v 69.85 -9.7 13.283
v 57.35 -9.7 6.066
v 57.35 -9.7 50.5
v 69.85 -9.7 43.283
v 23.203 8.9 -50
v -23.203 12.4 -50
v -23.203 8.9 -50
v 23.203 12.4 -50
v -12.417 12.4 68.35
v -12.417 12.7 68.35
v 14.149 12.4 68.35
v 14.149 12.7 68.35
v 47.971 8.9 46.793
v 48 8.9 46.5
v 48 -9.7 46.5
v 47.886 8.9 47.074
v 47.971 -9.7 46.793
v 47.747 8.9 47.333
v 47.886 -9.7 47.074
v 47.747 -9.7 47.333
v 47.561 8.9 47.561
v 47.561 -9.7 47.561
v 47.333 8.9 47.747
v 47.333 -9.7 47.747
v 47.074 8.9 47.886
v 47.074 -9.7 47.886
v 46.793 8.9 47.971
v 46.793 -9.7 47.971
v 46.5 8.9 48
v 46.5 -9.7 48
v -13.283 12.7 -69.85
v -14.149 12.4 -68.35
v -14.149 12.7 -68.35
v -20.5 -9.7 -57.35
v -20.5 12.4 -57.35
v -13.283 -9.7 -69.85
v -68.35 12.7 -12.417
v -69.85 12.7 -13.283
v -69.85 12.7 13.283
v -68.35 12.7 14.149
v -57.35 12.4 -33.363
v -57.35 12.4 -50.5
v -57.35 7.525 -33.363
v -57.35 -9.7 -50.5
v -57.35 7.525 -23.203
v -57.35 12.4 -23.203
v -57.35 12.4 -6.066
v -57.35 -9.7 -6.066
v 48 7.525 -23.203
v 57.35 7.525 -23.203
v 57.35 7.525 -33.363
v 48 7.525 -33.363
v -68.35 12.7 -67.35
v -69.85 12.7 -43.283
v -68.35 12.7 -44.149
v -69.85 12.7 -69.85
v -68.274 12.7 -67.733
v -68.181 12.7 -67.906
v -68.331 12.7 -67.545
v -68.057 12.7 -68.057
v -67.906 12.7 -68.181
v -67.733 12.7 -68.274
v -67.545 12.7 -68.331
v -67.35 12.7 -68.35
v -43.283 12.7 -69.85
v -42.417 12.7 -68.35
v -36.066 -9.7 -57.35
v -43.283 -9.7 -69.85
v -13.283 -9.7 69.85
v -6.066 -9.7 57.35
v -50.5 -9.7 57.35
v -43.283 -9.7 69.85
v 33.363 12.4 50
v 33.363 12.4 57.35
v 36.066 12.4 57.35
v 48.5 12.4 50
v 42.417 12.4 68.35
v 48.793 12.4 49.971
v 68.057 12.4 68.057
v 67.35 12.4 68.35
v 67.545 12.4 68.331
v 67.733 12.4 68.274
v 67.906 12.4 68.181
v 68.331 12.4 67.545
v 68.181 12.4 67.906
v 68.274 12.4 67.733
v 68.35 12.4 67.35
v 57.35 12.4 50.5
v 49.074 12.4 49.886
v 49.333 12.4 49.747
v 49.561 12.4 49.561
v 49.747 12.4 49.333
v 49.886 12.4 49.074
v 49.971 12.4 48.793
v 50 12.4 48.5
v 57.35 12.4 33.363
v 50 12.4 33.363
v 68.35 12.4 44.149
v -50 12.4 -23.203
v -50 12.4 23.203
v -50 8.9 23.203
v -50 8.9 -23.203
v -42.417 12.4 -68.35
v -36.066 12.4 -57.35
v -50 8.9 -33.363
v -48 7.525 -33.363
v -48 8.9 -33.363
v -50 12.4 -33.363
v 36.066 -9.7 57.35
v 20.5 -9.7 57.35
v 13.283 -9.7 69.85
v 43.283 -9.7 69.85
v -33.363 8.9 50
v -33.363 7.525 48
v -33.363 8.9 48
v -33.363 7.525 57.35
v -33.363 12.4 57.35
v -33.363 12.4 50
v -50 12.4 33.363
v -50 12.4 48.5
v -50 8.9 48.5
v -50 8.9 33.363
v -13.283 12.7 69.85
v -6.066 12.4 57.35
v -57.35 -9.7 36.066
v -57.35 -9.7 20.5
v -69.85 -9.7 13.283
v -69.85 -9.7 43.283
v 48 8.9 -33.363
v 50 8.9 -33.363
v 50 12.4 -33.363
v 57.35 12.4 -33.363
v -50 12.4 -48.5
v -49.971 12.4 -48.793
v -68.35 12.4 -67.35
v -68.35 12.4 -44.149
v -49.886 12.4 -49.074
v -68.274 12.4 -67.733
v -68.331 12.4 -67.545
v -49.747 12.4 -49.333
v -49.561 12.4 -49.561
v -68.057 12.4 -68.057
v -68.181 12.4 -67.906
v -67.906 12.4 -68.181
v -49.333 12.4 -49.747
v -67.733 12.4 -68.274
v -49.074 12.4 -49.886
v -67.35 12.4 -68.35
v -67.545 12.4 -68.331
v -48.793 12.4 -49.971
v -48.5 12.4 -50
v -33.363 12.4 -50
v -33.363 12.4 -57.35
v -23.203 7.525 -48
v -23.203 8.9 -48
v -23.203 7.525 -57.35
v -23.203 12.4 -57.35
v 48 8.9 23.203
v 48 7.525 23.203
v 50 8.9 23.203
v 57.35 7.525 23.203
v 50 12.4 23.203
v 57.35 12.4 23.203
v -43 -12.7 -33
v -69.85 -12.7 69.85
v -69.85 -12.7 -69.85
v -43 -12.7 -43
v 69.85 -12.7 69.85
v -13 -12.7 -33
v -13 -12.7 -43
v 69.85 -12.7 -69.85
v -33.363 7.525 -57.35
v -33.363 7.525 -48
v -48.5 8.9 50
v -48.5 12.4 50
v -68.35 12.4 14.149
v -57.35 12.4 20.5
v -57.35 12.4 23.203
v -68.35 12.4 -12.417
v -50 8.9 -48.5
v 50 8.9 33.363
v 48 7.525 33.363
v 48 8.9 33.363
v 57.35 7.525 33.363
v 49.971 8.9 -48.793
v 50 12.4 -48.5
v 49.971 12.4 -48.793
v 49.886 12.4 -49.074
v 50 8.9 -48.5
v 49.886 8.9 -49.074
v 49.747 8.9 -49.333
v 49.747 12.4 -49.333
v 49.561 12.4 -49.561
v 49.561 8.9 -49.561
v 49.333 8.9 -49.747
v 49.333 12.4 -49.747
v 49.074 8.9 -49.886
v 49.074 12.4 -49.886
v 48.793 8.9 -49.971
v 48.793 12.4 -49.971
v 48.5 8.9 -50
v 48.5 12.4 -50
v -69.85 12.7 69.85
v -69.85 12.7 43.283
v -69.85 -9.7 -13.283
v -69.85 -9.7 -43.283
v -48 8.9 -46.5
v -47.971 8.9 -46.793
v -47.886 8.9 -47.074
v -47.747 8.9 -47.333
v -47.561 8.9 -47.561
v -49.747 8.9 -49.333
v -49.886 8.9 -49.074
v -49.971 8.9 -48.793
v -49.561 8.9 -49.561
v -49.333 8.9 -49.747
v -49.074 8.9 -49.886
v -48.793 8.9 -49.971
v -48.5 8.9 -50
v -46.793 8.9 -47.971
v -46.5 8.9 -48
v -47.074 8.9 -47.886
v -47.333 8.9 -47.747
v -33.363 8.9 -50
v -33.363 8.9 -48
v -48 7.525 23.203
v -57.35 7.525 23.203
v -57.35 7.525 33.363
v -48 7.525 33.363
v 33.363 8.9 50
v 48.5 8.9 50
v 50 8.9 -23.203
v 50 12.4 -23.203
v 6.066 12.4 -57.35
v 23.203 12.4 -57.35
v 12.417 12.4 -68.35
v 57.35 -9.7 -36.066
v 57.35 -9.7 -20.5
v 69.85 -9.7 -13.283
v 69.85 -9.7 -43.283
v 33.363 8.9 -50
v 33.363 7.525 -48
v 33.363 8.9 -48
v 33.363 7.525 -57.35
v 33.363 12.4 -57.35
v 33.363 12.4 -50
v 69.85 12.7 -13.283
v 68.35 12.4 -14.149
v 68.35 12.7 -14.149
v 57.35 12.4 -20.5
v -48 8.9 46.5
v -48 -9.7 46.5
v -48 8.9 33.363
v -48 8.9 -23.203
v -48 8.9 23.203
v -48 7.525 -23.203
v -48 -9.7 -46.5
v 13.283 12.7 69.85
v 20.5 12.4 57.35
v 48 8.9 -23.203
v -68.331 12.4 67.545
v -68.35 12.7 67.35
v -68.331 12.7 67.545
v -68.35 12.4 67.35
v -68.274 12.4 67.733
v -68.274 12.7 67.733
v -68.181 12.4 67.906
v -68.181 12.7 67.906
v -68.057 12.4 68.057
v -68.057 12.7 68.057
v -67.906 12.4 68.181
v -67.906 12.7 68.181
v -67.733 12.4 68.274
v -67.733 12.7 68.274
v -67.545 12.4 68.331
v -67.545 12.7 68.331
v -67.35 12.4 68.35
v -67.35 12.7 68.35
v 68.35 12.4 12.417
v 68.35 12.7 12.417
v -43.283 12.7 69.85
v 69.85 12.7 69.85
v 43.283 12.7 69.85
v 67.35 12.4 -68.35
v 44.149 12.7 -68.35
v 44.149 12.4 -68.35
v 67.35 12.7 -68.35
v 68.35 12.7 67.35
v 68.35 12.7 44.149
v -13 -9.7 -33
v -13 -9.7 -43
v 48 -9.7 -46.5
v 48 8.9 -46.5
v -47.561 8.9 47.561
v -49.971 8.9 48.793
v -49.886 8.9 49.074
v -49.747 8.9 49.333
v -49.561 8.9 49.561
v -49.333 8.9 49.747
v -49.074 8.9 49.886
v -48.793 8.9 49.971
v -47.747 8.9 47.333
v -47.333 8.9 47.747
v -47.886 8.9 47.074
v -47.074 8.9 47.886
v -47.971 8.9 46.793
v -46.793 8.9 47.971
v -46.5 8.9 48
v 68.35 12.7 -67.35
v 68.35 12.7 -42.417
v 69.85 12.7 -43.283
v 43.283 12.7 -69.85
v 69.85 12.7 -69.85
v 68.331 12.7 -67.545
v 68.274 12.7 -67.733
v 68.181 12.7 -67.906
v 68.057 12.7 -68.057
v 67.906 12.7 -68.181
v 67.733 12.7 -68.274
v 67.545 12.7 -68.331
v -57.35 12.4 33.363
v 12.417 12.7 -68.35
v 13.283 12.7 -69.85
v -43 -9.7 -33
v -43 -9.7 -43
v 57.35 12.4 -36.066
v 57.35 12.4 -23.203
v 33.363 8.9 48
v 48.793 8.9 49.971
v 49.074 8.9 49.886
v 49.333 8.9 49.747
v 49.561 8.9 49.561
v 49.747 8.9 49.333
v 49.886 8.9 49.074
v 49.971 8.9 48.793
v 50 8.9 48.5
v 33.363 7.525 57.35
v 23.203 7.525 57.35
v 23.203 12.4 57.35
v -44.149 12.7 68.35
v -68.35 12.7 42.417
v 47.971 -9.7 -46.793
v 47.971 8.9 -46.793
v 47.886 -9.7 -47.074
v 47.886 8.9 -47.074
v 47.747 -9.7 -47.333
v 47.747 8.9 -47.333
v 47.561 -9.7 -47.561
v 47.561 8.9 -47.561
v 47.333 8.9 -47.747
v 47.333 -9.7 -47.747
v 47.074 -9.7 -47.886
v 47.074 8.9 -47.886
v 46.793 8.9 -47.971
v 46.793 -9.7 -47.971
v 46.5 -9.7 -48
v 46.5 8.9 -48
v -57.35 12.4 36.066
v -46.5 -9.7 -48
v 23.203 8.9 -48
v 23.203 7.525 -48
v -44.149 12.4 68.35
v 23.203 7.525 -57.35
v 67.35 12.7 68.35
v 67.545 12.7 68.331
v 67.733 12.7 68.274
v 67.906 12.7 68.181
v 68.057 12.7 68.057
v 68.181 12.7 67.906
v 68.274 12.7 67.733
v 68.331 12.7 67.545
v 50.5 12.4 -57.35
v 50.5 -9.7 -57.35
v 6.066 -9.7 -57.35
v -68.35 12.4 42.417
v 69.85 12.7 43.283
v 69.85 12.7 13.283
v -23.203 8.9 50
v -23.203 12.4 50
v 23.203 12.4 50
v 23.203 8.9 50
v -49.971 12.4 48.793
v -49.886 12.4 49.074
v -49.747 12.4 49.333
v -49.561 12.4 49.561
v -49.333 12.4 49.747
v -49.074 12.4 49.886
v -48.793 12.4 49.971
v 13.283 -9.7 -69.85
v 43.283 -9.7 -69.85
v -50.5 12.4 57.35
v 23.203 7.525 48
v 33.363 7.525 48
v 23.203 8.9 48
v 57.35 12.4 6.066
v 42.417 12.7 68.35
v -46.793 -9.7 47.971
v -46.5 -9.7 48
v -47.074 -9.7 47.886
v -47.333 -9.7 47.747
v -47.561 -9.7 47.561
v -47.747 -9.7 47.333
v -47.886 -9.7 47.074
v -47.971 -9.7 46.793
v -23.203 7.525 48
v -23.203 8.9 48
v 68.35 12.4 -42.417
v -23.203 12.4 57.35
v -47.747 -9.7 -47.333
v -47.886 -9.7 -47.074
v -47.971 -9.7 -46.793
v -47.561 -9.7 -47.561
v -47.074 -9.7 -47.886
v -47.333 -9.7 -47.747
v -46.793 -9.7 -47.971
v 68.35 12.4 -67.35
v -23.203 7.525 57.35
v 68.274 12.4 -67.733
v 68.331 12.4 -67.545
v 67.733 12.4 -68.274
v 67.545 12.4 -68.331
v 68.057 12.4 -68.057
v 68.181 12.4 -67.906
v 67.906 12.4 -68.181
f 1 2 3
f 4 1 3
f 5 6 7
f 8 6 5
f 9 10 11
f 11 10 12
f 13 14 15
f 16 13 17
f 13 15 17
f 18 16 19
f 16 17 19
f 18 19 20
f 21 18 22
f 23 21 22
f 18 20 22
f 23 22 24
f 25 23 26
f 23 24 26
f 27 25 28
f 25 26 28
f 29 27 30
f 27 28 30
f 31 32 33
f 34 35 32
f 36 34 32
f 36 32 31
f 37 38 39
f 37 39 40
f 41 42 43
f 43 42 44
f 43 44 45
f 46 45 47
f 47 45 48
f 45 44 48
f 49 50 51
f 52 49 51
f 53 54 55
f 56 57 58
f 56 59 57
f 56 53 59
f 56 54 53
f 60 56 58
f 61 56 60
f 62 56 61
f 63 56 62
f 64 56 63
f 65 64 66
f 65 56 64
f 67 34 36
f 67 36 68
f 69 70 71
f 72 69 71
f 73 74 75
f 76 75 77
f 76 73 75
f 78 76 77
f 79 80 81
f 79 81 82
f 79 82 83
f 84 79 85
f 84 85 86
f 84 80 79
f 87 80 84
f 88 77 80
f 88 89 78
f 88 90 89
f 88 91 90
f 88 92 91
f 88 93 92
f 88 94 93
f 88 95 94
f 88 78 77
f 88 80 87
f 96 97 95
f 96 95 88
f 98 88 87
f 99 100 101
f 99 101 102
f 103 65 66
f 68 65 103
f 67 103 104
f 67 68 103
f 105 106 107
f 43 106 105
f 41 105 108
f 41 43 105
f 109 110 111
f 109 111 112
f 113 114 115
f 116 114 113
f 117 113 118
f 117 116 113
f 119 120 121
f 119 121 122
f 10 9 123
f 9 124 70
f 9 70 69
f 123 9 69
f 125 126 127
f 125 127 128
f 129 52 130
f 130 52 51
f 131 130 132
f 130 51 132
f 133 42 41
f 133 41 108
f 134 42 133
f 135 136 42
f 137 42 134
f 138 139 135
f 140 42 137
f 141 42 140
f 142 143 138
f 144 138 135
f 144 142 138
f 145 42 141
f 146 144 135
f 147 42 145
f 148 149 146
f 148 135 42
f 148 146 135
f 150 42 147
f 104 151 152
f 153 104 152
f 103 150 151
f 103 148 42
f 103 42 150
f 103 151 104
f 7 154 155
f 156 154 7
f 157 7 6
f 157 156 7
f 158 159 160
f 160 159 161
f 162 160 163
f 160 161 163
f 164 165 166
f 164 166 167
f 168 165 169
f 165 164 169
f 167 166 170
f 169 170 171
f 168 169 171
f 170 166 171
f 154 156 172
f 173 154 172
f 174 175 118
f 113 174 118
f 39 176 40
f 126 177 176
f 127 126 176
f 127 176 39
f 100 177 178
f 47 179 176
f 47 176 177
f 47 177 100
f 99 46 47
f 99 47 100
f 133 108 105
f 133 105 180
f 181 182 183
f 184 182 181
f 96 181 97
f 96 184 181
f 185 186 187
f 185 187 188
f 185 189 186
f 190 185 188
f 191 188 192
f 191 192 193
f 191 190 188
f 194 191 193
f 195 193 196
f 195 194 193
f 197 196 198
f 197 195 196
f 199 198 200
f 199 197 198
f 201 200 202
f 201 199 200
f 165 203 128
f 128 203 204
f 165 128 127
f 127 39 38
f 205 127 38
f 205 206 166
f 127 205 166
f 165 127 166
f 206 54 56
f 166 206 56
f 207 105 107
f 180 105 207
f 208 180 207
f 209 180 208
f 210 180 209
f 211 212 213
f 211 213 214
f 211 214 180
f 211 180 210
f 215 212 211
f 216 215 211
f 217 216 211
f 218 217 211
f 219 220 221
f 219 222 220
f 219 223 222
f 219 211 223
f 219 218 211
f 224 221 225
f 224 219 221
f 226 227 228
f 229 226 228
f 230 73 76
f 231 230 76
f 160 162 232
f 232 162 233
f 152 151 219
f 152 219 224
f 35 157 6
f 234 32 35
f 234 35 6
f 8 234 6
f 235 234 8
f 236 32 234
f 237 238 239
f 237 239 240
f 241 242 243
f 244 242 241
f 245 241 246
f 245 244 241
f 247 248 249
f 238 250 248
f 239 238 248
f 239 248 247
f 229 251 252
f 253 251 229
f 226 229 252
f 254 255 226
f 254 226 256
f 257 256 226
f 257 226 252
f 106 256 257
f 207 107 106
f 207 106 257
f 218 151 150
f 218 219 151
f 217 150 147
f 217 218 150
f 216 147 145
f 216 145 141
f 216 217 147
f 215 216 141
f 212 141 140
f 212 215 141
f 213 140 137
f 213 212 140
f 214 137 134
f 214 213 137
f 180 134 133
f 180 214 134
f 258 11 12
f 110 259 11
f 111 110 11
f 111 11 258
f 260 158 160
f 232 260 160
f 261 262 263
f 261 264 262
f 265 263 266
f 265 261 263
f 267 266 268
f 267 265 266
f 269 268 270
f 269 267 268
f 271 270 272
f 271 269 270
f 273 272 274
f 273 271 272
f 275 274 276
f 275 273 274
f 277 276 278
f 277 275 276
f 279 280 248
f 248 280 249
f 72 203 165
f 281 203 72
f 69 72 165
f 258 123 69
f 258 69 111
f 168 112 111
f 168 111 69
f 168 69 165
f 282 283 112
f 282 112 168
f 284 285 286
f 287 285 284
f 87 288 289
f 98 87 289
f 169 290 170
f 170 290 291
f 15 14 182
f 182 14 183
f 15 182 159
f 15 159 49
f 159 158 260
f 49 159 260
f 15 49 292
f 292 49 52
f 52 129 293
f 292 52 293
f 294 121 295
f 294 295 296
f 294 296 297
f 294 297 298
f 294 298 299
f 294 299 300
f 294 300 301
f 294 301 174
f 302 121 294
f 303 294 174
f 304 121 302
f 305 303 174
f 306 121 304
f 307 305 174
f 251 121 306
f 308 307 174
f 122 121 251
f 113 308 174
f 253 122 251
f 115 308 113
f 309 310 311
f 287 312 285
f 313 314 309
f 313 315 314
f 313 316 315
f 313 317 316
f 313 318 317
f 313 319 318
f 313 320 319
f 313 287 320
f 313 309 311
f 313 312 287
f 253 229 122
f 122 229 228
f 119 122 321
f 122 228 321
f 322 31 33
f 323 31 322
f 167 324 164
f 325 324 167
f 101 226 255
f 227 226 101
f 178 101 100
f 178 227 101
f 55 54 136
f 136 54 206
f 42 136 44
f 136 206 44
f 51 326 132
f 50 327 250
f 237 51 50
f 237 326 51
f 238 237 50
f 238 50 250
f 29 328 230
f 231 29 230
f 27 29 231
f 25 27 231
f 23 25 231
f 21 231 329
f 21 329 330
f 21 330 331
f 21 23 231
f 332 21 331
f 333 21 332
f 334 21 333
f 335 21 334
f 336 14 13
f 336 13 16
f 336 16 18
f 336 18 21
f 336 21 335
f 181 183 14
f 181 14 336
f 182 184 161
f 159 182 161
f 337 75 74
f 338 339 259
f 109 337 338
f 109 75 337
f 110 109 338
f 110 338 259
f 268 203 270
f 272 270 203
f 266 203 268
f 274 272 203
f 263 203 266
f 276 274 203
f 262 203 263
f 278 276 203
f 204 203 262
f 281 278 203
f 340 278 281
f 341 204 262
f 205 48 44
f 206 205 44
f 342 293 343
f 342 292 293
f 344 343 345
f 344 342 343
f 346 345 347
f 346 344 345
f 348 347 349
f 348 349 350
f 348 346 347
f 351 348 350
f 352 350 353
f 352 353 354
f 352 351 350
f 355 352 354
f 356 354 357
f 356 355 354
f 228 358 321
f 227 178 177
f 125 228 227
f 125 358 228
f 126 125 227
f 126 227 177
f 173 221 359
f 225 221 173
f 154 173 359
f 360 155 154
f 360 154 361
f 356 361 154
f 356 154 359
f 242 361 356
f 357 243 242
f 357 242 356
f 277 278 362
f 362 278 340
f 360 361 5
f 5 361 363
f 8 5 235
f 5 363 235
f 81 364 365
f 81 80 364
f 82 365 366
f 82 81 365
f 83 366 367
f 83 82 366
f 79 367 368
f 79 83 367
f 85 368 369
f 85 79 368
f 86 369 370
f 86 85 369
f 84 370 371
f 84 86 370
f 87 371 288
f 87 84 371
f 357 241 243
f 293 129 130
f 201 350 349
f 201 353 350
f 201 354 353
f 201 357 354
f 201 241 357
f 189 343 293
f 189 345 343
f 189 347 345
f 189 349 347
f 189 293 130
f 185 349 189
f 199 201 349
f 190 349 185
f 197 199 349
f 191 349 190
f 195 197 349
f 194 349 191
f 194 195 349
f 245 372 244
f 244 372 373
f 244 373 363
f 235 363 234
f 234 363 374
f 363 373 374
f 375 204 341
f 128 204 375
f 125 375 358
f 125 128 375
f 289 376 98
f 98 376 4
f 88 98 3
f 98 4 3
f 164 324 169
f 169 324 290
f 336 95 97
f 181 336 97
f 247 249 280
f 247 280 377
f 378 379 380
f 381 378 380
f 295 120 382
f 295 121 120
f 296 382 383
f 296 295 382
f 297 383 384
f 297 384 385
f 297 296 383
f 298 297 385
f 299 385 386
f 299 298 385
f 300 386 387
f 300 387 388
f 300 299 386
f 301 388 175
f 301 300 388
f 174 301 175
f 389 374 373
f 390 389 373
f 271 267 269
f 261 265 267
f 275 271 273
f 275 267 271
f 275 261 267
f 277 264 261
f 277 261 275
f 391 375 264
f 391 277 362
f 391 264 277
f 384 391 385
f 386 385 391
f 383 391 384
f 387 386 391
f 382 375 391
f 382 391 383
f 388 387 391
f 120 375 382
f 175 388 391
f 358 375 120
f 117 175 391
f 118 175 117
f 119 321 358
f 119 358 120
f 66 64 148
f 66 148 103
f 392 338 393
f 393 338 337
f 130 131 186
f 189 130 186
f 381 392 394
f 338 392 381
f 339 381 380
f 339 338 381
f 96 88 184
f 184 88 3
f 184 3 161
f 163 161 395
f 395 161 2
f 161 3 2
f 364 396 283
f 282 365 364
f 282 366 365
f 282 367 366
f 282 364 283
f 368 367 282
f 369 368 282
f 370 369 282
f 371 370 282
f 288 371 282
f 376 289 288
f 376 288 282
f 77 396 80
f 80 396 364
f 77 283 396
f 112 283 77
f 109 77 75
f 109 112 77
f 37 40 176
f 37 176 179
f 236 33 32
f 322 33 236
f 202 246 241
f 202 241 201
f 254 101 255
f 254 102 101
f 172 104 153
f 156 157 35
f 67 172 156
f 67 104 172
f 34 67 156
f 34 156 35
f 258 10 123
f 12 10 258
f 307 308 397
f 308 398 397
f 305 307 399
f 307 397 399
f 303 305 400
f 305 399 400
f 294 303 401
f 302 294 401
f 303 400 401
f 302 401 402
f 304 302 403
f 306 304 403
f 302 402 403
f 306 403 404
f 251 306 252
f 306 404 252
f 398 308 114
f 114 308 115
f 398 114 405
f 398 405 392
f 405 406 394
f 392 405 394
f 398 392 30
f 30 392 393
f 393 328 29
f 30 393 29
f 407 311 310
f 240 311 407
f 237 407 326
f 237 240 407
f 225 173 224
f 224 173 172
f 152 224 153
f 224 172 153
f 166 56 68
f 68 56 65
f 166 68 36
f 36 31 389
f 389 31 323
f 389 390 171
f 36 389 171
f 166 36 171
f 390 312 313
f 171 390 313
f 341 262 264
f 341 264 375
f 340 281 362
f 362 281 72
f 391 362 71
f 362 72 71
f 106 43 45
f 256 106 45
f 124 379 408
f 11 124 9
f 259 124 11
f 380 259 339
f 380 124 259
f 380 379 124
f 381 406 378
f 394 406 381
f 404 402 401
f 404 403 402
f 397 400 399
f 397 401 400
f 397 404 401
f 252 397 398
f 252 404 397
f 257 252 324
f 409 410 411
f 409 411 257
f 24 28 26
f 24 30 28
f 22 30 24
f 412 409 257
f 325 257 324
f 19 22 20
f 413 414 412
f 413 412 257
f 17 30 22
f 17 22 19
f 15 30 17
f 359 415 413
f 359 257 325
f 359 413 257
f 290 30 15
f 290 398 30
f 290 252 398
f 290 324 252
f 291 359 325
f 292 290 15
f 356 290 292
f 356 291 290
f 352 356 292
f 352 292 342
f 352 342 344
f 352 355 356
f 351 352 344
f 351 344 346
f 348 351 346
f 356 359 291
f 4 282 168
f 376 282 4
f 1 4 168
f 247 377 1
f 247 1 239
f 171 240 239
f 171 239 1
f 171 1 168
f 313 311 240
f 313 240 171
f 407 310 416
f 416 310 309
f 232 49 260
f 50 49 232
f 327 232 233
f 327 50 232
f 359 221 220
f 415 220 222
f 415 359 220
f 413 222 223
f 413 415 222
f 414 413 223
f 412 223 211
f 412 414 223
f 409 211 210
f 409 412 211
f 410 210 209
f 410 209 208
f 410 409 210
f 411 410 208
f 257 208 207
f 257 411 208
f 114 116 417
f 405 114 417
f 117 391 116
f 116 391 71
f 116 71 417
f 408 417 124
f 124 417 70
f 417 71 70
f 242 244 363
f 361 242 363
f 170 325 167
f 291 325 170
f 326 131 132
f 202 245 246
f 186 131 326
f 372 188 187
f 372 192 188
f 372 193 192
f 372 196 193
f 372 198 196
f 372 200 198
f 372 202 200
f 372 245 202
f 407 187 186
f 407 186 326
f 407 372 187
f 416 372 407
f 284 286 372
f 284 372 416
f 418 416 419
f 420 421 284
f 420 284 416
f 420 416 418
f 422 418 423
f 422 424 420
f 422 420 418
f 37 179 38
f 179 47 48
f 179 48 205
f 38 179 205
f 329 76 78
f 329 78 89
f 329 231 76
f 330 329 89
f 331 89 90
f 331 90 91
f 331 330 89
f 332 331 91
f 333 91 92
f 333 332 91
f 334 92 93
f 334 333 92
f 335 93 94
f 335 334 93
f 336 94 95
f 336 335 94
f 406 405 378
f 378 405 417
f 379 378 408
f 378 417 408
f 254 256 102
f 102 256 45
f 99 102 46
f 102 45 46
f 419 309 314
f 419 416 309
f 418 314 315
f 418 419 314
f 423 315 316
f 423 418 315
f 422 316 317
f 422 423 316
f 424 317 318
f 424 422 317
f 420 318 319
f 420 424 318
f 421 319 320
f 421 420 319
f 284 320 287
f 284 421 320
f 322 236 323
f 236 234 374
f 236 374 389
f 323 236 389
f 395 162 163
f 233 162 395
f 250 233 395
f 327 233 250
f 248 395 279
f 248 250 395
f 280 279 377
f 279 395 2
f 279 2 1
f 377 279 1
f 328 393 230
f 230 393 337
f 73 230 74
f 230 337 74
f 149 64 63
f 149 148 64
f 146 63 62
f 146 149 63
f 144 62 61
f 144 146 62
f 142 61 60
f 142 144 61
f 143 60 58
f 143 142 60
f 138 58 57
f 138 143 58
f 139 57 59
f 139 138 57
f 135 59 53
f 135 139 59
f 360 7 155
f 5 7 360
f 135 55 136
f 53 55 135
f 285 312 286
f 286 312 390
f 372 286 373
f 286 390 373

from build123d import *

# Parameters (mm, degrees)
SKETCH1_W           = 139.7
SKETCH1_H           = 139.7
BOSS_EXTRUDE1_DEPTH = 12.7
SKETCH2_W           = 136.7
SKETCH2_H           = 136.7
CUT_EXTRUDE1_DEPTH  = 0.3
CUT_EXTRUDE2_START  = -22.4
CUT_EXTRUDE2_DEPTH  = 125.396102867
SKETCH18_W          = 10.16
SKETCH18_H          = 4.875
CUT_EXTRUDE6_DEPTH  = 20
FILLET1_R           = 1
CIRPATTERN1_COUNT   = 4
SKETCH19_W          = 100
SKETCH19_H          = 100
CUT_EXTRUDE8_DEPTH  = 3.5
SKETCH20_W          = 96
SKETCH20_H          = 96
CUT_EXTRUDE9_DEPTH  = 18.6
SKETCH21_W          = 30
SKETCH21_H          = 10
CUT_EXTRUDE10_DEPTH = 102.290695525
FILLET2_R           = 1.5


with BuildPart() as part:
    # Sketch1 → Boss-Extrude1 (new, symmetric)
    with BuildSketch(Plane(origin=(0, 0, 0), x_dir=(1, 0, 0), z_dir=(0, 1, 0))):
        Rectangle(SKETCH1_W, SKETCH1_H)
    extrude(amount=BOSS_EXTRUDE1_DEPTH, both=True)

    # Sketch2 → Cut-Extrude1 (cut)
    with BuildSketch(Plane(origin=(0, 12.7, 0), x_dir=(1, 0, 0), z_dir=(0, 1, 0))):
        Rectangle(SKETCH2_W, SKETCH2_H)
    extrude(amount=-CUT_EXTRUDE1_DEPTH, mode=Mode.SUBTRACT)

    # Sketch4 → Cut-Extrude2 (cut)
    with BuildSketch(Plane(origin=(0, 12.7, 0), x_dir=(1, 0, 0), z_dir=(0, 1, 0)).offset(CUT_EXTRUDE2_START)):
        Polygon((-43.283333333, -69.85), (-50.500211698, -57.35), (-6.066454968, -57.35), (-13.283333333, -69.85), align=None)
        Polygon((43.283333333, -69.85), (36.066454968, -57.35), (20.500211698, -57.35), (13.283333333, -69.85), align=None)
    cut_extrude2 = extrude(amount=CUT_EXTRUDE2_DEPTH, mode=Mode.SUBTRACT)

    # Sketch18 → Cut-Extrude6 (cut)
    with BuildSketch(Plane.XY.offset(57.35)):
        with Locations((28.283333333, 9.9625)):
            Rectangle(SKETCH18_W, SKETCH18_H)
        with Locations((-28.283333333, 9.9625)):
            Rectangle(SKETCH18_W, SKETCH18_H)
    cut_extrude6 = extrude(amount=-CUT_EXTRUDE6_DEPTH, mode=Mode.SUBTRACT)

    # Fillet1
    fillet1_edges = [part.edges().sort_by_distance(p)[0] for p in [
        (-68.35, 12.55, -68.35),
        (-68.35, 12.55, 68.35),
        (68.35, 12.55, 68.35),
        (68.35, 12.55, -68.35),
    ]]
    fillet(fillet1_edges, radius=FILLET1_R)

    # CirPattern1: Cut-Extrude2, Cut-Extrude6 ×4 about axis
    cirpattern1_axis = Axis((0, 0, 0), (0, 1, 0))
    add([cut_extrude2.rotate(cirpattern1_axis, i * 360 / CIRPATTERN1_COUNT) for i in range(1, CIRPATTERN1_COUNT)], mode=Mode.SUBTRACT)
    add([cut_extrude6.rotate(cirpattern1_axis, i * 360 / CIRPATTERN1_COUNT) for i in range(1, CIRPATTERN1_COUNT)], mode=Mode.SUBTRACT)

    # Sketch19 → Cut-Extrude8 (cut)
    with BuildSketch(Plane(origin=(0, 12.4, 0), x_dir=(1, 0, 0), z_dir=(0, 1, 0))):
        Rectangle(SKETCH19_W, SKETCH19_H)
    extrude(amount=-CUT_EXTRUDE8_DEPTH, mode=Mode.SUBTRACT)

    # Sketch20 → Cut-Extrude9 (cut)
    with BuildSketch(Plane(origin=(0, 8.9, 0), x_dir=(1, 0, 0), z_dir=(0, 1, 0))):
        Rectangle(SKETCH20_W, SKETCH20_H)
    extrude(amount=-CUT_EXTRUDE9_DEPTH, mode=Mode.SUBTRACT)

    # Sketch21 → Cut-Extrude10 (cut, through all)
    with BuildSketch(Plane(origin=(0, -9.7, 0), x_dir=(1, 0, 0), z_dir=(0, 1, 0))):
        with Locations((-28, 38)):
            Rectangle(SKETCH21_W, SKETCH21_H)
    extrude(amount=-CUT_EXTRUDE10_DEPTH, mode=Mode.SUBTRACT)

    # Fillet2
    fillet2_edges = [part.edges().sort_by_distance(p)[0] for p in [
        (50, 10.65, 50),
        (-50, 10.65, -50),
        (-50, 10.65, 50),
        (50, 10.65, -50),
        (48, -0.4, -48),
        (48, -0.4, 48),
        (-48, -0.4, 48),
        (-48, -0.4, -48),
    ]]
    fillet(fillet2_edges, radius=FILLET2_R)


solid = part.part
